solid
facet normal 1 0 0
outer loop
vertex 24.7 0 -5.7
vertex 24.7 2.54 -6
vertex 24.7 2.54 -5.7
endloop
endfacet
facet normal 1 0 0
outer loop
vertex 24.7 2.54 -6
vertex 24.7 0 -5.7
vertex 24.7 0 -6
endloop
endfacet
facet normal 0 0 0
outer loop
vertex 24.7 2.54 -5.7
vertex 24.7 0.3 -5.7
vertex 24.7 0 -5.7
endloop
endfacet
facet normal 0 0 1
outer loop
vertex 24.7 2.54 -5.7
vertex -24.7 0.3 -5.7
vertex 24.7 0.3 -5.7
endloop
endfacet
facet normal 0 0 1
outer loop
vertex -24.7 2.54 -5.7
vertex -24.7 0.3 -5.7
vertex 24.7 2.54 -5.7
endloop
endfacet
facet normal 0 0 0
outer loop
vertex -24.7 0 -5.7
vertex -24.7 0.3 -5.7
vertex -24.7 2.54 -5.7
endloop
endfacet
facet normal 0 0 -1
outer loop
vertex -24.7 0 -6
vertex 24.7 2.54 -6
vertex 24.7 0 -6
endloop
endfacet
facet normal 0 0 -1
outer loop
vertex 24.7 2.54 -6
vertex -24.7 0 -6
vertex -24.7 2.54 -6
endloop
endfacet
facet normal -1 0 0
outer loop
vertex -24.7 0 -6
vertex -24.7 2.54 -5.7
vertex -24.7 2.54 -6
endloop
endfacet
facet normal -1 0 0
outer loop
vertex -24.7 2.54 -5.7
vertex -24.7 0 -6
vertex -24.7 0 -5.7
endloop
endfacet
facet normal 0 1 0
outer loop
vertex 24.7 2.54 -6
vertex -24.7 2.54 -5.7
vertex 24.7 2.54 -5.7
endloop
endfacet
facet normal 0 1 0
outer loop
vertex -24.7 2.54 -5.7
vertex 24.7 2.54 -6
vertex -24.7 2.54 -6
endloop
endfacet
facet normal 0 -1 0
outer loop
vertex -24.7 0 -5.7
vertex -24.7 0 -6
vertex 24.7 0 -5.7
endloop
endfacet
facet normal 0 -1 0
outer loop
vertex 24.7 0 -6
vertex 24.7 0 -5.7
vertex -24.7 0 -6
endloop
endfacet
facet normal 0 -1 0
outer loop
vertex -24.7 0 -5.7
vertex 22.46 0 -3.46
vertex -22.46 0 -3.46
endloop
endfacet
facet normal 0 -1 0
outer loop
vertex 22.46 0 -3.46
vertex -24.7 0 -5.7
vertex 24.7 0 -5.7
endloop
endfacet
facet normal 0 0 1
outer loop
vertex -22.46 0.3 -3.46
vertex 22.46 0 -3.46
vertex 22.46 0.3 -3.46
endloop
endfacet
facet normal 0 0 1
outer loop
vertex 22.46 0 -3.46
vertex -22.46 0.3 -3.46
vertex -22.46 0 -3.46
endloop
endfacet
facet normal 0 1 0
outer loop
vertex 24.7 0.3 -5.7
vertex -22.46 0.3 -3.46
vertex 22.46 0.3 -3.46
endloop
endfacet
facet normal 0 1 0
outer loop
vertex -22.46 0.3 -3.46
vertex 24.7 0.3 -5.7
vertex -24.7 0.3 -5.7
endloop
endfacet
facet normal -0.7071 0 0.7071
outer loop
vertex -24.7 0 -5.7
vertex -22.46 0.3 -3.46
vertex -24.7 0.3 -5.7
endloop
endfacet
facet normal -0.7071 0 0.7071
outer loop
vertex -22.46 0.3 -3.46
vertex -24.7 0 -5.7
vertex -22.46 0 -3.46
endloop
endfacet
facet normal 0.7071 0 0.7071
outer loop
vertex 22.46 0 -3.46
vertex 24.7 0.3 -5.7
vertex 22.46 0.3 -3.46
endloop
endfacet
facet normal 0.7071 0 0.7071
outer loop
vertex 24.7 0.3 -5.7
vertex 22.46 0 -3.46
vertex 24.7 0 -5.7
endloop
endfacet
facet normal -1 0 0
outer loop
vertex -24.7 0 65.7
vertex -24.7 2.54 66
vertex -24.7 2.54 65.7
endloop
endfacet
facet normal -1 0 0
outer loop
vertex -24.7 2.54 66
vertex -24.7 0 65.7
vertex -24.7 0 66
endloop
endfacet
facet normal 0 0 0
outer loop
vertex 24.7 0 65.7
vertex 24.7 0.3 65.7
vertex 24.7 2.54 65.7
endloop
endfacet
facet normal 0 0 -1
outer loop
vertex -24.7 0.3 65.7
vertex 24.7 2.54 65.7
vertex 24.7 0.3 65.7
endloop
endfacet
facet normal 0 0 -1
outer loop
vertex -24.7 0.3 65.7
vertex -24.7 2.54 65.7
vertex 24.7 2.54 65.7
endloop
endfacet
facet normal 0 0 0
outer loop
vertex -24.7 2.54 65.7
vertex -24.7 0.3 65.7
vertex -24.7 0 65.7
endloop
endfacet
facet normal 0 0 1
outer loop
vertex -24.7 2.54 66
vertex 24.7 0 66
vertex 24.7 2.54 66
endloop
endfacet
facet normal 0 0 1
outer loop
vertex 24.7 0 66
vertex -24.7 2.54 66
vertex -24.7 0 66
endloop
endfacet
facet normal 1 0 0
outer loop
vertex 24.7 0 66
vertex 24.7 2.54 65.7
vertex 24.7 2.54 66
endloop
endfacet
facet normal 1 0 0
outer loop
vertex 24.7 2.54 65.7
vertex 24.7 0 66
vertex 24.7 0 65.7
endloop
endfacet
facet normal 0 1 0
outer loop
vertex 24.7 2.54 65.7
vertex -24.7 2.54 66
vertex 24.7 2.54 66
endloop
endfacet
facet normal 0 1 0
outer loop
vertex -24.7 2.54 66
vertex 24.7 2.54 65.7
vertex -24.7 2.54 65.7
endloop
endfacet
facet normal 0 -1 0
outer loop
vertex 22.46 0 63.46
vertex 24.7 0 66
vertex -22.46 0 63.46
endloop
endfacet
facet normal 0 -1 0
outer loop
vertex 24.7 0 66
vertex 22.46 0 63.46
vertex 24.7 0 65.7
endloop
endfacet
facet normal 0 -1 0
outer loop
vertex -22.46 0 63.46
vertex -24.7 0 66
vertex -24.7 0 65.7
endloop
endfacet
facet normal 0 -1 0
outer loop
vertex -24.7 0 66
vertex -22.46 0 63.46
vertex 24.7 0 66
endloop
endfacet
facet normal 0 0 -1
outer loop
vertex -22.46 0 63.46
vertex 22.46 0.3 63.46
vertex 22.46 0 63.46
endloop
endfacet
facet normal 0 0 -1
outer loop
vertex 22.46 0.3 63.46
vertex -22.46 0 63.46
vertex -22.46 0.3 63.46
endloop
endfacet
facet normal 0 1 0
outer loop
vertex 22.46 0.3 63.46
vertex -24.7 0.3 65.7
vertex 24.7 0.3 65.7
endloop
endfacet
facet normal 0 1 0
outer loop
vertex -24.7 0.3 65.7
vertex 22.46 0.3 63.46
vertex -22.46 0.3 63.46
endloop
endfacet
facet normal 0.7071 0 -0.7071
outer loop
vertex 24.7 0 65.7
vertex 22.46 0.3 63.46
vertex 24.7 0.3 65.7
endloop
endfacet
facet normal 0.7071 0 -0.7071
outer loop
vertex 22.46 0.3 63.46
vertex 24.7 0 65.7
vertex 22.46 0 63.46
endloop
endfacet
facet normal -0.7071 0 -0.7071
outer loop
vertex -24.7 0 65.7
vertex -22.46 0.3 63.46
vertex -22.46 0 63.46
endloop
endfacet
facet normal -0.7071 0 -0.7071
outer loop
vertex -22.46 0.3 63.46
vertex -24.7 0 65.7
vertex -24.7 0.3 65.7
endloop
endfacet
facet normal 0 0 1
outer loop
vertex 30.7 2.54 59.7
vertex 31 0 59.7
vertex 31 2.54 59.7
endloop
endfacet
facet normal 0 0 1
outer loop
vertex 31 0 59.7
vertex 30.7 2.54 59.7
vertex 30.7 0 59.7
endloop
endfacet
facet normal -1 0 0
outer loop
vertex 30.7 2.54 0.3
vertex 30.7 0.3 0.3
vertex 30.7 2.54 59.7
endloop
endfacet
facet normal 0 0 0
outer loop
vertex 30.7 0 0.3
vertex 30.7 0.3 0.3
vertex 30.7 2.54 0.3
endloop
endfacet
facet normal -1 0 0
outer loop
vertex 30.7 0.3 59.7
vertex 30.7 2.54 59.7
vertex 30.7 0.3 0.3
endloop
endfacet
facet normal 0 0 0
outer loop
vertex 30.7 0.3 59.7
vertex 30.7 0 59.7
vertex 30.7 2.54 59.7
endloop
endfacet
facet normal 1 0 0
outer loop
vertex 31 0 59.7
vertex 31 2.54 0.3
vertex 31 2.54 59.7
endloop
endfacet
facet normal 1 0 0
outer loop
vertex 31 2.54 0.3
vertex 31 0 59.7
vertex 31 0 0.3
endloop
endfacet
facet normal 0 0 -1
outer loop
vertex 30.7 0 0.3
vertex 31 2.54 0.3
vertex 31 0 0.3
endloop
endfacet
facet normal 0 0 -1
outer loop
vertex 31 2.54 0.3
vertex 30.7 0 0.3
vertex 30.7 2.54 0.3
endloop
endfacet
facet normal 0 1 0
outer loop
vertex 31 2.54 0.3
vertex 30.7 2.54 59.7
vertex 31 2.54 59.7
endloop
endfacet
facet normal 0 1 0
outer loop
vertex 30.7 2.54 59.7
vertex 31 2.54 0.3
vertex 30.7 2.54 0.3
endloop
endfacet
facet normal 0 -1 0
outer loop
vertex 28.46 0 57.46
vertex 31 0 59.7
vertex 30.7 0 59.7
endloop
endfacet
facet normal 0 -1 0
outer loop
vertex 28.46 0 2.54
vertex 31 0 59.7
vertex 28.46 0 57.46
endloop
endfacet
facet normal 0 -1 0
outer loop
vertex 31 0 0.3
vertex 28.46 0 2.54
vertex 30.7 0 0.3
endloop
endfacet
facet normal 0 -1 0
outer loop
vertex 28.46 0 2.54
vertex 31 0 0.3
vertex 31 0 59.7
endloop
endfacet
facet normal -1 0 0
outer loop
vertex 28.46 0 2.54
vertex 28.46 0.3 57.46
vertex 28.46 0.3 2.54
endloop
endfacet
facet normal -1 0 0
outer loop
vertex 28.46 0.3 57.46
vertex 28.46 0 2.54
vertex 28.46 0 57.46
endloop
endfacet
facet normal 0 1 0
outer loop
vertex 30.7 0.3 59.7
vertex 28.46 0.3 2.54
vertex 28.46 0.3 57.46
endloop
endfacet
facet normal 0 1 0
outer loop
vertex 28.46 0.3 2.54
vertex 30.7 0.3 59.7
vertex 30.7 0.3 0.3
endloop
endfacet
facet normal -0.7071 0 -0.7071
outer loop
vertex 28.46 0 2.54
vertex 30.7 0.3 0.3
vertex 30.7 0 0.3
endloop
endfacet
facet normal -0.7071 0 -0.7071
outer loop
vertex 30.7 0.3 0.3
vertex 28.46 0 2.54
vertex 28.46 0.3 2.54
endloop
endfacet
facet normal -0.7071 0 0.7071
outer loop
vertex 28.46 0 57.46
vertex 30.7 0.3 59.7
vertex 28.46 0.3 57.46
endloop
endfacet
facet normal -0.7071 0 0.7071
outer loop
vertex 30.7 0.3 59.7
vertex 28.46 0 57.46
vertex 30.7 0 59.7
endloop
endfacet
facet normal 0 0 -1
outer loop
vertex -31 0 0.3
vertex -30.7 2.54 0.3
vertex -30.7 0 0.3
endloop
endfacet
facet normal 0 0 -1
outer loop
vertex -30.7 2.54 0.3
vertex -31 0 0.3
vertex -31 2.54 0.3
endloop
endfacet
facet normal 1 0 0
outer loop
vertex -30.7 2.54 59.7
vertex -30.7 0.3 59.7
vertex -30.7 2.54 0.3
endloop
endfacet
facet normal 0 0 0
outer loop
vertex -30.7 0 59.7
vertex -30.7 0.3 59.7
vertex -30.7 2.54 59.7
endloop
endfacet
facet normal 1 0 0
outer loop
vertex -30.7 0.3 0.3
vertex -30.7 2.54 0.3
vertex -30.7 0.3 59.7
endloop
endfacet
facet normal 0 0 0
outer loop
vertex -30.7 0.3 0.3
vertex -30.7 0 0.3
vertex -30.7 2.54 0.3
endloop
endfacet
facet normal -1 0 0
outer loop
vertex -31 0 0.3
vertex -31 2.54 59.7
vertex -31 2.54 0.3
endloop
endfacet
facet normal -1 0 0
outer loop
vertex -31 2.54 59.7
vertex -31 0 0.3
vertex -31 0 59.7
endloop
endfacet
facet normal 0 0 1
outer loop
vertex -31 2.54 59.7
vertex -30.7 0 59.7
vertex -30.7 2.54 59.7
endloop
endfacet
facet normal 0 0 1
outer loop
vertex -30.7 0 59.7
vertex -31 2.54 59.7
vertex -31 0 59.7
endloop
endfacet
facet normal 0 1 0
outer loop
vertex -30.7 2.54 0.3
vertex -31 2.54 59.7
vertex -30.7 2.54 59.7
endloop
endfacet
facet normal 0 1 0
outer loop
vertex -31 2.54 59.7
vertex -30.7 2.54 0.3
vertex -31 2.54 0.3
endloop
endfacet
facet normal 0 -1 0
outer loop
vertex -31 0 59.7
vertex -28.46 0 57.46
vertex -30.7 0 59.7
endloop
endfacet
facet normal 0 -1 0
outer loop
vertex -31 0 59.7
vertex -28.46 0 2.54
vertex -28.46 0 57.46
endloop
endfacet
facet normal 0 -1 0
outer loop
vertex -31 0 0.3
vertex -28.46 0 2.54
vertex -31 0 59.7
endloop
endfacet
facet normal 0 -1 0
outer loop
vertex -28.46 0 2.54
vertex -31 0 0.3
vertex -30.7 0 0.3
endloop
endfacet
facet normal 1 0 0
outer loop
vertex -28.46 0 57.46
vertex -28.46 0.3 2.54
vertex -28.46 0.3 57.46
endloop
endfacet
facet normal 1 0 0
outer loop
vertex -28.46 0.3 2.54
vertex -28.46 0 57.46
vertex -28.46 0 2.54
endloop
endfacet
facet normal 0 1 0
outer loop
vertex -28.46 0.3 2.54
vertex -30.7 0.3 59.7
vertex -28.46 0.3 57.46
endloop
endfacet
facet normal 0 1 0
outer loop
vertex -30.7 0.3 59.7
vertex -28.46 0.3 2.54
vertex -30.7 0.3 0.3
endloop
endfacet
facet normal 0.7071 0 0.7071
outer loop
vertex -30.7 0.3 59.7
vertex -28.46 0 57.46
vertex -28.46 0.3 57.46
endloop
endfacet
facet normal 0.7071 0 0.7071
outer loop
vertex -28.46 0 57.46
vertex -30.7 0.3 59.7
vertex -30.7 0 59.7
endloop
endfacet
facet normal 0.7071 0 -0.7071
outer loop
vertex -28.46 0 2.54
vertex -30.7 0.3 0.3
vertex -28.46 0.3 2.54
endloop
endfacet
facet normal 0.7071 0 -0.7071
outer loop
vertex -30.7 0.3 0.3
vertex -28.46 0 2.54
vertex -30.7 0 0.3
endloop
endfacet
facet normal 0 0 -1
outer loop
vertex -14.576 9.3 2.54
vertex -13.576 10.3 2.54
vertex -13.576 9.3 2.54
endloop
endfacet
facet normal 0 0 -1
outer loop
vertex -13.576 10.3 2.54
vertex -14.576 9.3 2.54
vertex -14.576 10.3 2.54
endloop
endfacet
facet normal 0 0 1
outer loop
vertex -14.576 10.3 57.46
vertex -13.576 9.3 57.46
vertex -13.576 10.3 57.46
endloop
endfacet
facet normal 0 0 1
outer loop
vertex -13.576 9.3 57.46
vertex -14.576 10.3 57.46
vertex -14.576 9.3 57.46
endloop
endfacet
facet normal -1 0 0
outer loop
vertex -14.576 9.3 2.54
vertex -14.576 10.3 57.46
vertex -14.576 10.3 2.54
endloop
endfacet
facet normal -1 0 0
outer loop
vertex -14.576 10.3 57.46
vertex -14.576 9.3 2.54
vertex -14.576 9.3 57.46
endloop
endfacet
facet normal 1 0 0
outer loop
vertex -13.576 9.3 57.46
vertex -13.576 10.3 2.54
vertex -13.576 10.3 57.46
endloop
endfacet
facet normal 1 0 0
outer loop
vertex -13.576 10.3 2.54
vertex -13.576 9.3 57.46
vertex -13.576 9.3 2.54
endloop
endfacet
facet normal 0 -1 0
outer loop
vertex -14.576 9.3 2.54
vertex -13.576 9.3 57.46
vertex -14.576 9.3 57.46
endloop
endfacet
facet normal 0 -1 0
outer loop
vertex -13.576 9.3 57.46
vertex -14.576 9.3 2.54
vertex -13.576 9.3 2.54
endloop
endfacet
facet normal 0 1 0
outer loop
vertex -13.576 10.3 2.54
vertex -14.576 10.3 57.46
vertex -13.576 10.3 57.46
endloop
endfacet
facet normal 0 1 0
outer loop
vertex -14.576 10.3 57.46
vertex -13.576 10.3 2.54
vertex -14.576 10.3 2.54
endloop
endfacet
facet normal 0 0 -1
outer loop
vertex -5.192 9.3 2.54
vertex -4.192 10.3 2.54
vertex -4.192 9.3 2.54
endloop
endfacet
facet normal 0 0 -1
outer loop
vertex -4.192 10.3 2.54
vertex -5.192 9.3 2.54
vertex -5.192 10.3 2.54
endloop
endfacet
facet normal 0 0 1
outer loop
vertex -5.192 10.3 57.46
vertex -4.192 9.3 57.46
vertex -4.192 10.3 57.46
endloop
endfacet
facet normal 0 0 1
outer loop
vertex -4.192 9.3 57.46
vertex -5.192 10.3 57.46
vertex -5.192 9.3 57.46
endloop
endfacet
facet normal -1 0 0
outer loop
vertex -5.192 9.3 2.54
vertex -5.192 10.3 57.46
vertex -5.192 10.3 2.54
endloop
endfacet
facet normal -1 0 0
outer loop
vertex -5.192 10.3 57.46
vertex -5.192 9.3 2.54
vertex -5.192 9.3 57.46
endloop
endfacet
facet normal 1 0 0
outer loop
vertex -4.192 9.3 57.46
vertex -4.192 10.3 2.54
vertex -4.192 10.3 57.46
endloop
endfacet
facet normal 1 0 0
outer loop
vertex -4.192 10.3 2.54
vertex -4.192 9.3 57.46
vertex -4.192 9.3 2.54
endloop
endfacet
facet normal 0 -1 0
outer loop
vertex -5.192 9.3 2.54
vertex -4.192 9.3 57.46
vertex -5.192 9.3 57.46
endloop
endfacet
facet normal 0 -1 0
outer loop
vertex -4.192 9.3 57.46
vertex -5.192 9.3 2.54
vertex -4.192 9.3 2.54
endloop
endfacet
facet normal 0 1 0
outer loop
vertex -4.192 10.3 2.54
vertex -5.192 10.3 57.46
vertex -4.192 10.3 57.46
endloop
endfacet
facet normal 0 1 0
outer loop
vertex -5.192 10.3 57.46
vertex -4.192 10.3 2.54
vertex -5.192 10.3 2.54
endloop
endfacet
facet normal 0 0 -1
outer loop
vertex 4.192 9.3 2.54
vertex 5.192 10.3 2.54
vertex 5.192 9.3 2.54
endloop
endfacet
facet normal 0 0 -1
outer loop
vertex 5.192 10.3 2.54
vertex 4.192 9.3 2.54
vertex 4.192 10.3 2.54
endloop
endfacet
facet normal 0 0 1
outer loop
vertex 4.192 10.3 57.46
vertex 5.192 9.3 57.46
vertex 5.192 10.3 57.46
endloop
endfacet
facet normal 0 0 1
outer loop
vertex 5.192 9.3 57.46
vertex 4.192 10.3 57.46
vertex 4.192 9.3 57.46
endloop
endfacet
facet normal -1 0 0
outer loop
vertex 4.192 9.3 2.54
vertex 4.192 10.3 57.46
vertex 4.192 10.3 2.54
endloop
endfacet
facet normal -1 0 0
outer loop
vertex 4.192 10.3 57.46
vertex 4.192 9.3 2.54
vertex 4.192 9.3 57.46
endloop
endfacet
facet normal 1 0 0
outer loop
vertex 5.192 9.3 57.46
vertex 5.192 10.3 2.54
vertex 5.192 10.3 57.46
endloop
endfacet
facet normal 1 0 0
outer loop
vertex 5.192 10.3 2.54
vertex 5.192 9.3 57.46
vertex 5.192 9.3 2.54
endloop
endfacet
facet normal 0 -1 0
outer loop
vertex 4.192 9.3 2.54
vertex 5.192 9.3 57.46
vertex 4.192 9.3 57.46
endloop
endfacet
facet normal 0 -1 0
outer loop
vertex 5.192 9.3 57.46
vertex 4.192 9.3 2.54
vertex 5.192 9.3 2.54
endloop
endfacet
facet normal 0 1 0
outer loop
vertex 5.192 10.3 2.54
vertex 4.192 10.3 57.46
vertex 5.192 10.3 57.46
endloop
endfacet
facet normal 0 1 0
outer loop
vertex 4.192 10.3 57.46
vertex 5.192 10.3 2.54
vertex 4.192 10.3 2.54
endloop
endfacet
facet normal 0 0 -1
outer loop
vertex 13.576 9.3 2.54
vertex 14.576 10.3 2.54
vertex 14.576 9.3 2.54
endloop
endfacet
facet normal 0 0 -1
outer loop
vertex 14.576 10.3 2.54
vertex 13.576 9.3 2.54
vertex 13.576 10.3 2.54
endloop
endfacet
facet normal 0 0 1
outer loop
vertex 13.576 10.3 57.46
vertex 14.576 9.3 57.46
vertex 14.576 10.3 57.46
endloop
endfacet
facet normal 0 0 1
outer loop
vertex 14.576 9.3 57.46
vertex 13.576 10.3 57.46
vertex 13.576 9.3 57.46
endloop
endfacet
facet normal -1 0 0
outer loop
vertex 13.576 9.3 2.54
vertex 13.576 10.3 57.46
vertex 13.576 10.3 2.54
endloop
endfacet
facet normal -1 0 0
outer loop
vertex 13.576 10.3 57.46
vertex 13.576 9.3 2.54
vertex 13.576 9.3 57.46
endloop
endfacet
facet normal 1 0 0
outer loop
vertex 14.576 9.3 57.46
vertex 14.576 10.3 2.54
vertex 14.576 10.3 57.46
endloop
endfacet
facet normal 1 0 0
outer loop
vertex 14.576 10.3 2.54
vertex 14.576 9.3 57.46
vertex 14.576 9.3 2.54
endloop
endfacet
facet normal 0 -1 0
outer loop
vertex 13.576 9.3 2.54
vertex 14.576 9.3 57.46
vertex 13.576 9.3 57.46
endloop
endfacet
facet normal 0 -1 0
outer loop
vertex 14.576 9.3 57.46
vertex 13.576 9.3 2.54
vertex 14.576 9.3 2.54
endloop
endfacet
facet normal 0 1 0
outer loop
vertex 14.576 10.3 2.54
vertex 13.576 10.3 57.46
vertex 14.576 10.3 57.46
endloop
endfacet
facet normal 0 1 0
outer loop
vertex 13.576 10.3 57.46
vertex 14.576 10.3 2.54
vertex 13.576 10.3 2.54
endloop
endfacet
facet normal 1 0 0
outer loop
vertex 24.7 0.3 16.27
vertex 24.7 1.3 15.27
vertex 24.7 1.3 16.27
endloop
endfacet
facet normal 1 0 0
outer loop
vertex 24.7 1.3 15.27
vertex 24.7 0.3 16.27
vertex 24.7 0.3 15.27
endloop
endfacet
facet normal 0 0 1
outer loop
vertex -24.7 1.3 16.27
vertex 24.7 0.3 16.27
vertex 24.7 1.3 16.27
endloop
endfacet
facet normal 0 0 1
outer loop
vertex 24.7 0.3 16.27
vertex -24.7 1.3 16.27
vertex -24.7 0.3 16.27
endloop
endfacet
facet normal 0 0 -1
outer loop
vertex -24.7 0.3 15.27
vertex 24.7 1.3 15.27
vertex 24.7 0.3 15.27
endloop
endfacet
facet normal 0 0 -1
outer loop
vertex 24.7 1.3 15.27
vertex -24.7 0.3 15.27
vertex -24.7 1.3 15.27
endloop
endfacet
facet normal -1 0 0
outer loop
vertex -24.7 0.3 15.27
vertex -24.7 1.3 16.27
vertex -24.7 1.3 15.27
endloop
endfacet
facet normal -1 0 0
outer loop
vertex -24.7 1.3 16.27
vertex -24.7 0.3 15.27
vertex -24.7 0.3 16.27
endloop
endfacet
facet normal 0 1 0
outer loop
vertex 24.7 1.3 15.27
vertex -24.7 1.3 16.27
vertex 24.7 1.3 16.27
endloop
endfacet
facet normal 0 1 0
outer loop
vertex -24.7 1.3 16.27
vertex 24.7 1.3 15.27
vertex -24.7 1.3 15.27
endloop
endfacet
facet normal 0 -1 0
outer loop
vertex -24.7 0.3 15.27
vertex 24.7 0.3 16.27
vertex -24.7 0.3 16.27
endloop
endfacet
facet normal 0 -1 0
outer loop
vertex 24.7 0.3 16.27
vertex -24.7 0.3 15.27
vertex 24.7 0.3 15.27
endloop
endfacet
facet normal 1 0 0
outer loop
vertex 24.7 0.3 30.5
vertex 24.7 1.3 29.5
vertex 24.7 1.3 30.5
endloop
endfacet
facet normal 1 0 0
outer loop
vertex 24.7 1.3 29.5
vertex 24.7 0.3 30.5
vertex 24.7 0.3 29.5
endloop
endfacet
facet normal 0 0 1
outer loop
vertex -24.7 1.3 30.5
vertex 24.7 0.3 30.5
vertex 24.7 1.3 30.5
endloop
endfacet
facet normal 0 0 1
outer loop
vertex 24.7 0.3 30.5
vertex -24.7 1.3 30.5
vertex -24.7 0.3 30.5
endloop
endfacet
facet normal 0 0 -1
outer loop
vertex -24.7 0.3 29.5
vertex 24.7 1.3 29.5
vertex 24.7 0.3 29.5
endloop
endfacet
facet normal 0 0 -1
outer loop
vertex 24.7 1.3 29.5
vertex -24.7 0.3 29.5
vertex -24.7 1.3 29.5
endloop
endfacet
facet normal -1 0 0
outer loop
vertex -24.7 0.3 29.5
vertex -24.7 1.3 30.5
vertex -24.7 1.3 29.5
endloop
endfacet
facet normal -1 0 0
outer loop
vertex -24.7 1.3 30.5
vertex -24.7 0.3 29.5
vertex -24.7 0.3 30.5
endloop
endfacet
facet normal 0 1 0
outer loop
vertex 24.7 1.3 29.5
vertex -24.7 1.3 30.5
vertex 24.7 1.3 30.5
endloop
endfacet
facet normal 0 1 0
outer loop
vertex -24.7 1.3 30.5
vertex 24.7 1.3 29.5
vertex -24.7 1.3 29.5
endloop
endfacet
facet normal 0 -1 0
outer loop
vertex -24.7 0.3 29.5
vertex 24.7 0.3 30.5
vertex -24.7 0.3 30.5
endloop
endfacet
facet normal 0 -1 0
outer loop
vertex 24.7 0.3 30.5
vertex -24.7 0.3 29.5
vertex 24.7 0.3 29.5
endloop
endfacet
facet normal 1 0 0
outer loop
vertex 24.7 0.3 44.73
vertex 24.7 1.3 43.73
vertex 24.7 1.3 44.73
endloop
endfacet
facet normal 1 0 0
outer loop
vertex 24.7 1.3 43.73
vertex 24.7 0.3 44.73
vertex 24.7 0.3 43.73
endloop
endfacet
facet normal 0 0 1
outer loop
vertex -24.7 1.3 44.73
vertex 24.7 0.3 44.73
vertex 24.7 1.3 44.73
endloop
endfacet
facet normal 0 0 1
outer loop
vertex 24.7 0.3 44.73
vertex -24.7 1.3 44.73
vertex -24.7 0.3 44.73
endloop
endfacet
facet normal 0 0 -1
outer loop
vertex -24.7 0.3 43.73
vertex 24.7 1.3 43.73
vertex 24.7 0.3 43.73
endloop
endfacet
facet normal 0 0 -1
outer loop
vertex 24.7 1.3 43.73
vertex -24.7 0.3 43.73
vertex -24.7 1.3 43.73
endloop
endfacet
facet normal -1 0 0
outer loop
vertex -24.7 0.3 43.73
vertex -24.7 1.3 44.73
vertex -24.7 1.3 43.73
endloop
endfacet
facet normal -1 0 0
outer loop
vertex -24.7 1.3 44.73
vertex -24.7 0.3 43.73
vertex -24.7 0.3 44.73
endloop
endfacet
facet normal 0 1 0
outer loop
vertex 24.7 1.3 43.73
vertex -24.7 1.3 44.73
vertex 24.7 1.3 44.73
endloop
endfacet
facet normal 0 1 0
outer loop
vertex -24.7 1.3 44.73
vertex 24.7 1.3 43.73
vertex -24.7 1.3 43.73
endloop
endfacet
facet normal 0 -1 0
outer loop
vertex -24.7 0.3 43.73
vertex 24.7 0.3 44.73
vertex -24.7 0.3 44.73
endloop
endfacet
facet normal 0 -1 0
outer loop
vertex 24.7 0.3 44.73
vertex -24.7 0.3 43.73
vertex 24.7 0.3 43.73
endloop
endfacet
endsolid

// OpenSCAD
// file: gridrod.scad
module gridrod(length=100, width=3, depth=1) 
{
    color([0.7,0.2,0.3])
    translate([0,depth/2,0])
    cube([length, depth, width], center=true);
}

gridrod();
// file: Lprofile.scad
module lprofile(length=100, width=2, thickness=0.5, angle45=true) 
{
    cut_depth = angle45 ? (width-thickness) : 0;
    l = angle45 ? (length-2*thickness) : length;

    color([0.9,0.3,0.3])
    translate([0,width/2,thickness/2])
    cube([l, width, thickness], center=true);
    
    color([0.9,0.3,0.3])
    translate([-l/2,thickness,0])
    rotate([90,0,0])
    linear_extrude(thickness) 
    polygon(points=[[0, 0],[0,thickness],[cut_depth,width],
        [l-cut_depth,width],[l,thickness],[l,0],
        [0,0]]);
}

lprofile();
// main file
use <Lprofile.scad>
use <gridrod.scad>

module windowgrid(height=60, width=50, lprofile_width=2.54, lprofile_thickness=0.3,explode=true) 
{
    gridrod_width=1.0;
    gridrod_depth=1.0;
    
    nro_vertical_bars = 4;
    nro_horizontal_bars = 3;
    explo_dist = explode ? 6 : 0;
    explo_dist2 = explode ? -10 : 0;

    translate([0,0,-explo_dist])
    lprofile(width, lprofile_width, lprofile_thickness, true) ;

    translate([0,0,height+explo_dist])
    rotate([180,0,180])
    lprofile(width, lprofile_width, lprofile_thickness, true) ;

    translate([width/2+explo_dist,0,height/2])
    rotate([0,270,0])
    lprofile(height, lprofile_width, lprofile_thickness, true) ;
    
    translate([-width/2-explo_dist,0,height/2])
    rotate([0,90,0])
    lprofile(height, lprofile_width, lprofile_thickness, true) ;

    xstep = (width-2.0*(lprofile_width-gridrod_width))/(nro_vertical_bars+1);
    xstart = -xstep * (nro_vertical_bars-1) / 2.0;
    verticalbar_h = height-2*lprofile_width;
    for (x=[0:nro_vertical_bars-1]) {
        xx = xstep * x + xstart;
        translate([xx,-(gridrod_depth-lprofile_thickness)-explo_dist2,
            verticalbar_h/2+lprofile_width])
        rotate([0,270,0])
        gridrod(verticalbar_h, gridrod_width, gridrod_depth);
    }

    ystep = (height-2.0*(lprofile_width-gridrod_width))/(nro_horizontal_bars+1);
    ystart = -ystep * (nro_horizontal_bars-1) / 2.0 + height/2;
    horizontalbar_l = width-2*lprofile_thickness;
    for (y=[0:nro_horizontal_bars-1]) {
        yy = ystep * y + ystart;
        translate([0, lprofile_thickness, yy])
        //rotate([0,270,0])
        gridrod(horizontalbar_l, gridrod_width, gridrod_depth);
    }
}

windowgrid();
